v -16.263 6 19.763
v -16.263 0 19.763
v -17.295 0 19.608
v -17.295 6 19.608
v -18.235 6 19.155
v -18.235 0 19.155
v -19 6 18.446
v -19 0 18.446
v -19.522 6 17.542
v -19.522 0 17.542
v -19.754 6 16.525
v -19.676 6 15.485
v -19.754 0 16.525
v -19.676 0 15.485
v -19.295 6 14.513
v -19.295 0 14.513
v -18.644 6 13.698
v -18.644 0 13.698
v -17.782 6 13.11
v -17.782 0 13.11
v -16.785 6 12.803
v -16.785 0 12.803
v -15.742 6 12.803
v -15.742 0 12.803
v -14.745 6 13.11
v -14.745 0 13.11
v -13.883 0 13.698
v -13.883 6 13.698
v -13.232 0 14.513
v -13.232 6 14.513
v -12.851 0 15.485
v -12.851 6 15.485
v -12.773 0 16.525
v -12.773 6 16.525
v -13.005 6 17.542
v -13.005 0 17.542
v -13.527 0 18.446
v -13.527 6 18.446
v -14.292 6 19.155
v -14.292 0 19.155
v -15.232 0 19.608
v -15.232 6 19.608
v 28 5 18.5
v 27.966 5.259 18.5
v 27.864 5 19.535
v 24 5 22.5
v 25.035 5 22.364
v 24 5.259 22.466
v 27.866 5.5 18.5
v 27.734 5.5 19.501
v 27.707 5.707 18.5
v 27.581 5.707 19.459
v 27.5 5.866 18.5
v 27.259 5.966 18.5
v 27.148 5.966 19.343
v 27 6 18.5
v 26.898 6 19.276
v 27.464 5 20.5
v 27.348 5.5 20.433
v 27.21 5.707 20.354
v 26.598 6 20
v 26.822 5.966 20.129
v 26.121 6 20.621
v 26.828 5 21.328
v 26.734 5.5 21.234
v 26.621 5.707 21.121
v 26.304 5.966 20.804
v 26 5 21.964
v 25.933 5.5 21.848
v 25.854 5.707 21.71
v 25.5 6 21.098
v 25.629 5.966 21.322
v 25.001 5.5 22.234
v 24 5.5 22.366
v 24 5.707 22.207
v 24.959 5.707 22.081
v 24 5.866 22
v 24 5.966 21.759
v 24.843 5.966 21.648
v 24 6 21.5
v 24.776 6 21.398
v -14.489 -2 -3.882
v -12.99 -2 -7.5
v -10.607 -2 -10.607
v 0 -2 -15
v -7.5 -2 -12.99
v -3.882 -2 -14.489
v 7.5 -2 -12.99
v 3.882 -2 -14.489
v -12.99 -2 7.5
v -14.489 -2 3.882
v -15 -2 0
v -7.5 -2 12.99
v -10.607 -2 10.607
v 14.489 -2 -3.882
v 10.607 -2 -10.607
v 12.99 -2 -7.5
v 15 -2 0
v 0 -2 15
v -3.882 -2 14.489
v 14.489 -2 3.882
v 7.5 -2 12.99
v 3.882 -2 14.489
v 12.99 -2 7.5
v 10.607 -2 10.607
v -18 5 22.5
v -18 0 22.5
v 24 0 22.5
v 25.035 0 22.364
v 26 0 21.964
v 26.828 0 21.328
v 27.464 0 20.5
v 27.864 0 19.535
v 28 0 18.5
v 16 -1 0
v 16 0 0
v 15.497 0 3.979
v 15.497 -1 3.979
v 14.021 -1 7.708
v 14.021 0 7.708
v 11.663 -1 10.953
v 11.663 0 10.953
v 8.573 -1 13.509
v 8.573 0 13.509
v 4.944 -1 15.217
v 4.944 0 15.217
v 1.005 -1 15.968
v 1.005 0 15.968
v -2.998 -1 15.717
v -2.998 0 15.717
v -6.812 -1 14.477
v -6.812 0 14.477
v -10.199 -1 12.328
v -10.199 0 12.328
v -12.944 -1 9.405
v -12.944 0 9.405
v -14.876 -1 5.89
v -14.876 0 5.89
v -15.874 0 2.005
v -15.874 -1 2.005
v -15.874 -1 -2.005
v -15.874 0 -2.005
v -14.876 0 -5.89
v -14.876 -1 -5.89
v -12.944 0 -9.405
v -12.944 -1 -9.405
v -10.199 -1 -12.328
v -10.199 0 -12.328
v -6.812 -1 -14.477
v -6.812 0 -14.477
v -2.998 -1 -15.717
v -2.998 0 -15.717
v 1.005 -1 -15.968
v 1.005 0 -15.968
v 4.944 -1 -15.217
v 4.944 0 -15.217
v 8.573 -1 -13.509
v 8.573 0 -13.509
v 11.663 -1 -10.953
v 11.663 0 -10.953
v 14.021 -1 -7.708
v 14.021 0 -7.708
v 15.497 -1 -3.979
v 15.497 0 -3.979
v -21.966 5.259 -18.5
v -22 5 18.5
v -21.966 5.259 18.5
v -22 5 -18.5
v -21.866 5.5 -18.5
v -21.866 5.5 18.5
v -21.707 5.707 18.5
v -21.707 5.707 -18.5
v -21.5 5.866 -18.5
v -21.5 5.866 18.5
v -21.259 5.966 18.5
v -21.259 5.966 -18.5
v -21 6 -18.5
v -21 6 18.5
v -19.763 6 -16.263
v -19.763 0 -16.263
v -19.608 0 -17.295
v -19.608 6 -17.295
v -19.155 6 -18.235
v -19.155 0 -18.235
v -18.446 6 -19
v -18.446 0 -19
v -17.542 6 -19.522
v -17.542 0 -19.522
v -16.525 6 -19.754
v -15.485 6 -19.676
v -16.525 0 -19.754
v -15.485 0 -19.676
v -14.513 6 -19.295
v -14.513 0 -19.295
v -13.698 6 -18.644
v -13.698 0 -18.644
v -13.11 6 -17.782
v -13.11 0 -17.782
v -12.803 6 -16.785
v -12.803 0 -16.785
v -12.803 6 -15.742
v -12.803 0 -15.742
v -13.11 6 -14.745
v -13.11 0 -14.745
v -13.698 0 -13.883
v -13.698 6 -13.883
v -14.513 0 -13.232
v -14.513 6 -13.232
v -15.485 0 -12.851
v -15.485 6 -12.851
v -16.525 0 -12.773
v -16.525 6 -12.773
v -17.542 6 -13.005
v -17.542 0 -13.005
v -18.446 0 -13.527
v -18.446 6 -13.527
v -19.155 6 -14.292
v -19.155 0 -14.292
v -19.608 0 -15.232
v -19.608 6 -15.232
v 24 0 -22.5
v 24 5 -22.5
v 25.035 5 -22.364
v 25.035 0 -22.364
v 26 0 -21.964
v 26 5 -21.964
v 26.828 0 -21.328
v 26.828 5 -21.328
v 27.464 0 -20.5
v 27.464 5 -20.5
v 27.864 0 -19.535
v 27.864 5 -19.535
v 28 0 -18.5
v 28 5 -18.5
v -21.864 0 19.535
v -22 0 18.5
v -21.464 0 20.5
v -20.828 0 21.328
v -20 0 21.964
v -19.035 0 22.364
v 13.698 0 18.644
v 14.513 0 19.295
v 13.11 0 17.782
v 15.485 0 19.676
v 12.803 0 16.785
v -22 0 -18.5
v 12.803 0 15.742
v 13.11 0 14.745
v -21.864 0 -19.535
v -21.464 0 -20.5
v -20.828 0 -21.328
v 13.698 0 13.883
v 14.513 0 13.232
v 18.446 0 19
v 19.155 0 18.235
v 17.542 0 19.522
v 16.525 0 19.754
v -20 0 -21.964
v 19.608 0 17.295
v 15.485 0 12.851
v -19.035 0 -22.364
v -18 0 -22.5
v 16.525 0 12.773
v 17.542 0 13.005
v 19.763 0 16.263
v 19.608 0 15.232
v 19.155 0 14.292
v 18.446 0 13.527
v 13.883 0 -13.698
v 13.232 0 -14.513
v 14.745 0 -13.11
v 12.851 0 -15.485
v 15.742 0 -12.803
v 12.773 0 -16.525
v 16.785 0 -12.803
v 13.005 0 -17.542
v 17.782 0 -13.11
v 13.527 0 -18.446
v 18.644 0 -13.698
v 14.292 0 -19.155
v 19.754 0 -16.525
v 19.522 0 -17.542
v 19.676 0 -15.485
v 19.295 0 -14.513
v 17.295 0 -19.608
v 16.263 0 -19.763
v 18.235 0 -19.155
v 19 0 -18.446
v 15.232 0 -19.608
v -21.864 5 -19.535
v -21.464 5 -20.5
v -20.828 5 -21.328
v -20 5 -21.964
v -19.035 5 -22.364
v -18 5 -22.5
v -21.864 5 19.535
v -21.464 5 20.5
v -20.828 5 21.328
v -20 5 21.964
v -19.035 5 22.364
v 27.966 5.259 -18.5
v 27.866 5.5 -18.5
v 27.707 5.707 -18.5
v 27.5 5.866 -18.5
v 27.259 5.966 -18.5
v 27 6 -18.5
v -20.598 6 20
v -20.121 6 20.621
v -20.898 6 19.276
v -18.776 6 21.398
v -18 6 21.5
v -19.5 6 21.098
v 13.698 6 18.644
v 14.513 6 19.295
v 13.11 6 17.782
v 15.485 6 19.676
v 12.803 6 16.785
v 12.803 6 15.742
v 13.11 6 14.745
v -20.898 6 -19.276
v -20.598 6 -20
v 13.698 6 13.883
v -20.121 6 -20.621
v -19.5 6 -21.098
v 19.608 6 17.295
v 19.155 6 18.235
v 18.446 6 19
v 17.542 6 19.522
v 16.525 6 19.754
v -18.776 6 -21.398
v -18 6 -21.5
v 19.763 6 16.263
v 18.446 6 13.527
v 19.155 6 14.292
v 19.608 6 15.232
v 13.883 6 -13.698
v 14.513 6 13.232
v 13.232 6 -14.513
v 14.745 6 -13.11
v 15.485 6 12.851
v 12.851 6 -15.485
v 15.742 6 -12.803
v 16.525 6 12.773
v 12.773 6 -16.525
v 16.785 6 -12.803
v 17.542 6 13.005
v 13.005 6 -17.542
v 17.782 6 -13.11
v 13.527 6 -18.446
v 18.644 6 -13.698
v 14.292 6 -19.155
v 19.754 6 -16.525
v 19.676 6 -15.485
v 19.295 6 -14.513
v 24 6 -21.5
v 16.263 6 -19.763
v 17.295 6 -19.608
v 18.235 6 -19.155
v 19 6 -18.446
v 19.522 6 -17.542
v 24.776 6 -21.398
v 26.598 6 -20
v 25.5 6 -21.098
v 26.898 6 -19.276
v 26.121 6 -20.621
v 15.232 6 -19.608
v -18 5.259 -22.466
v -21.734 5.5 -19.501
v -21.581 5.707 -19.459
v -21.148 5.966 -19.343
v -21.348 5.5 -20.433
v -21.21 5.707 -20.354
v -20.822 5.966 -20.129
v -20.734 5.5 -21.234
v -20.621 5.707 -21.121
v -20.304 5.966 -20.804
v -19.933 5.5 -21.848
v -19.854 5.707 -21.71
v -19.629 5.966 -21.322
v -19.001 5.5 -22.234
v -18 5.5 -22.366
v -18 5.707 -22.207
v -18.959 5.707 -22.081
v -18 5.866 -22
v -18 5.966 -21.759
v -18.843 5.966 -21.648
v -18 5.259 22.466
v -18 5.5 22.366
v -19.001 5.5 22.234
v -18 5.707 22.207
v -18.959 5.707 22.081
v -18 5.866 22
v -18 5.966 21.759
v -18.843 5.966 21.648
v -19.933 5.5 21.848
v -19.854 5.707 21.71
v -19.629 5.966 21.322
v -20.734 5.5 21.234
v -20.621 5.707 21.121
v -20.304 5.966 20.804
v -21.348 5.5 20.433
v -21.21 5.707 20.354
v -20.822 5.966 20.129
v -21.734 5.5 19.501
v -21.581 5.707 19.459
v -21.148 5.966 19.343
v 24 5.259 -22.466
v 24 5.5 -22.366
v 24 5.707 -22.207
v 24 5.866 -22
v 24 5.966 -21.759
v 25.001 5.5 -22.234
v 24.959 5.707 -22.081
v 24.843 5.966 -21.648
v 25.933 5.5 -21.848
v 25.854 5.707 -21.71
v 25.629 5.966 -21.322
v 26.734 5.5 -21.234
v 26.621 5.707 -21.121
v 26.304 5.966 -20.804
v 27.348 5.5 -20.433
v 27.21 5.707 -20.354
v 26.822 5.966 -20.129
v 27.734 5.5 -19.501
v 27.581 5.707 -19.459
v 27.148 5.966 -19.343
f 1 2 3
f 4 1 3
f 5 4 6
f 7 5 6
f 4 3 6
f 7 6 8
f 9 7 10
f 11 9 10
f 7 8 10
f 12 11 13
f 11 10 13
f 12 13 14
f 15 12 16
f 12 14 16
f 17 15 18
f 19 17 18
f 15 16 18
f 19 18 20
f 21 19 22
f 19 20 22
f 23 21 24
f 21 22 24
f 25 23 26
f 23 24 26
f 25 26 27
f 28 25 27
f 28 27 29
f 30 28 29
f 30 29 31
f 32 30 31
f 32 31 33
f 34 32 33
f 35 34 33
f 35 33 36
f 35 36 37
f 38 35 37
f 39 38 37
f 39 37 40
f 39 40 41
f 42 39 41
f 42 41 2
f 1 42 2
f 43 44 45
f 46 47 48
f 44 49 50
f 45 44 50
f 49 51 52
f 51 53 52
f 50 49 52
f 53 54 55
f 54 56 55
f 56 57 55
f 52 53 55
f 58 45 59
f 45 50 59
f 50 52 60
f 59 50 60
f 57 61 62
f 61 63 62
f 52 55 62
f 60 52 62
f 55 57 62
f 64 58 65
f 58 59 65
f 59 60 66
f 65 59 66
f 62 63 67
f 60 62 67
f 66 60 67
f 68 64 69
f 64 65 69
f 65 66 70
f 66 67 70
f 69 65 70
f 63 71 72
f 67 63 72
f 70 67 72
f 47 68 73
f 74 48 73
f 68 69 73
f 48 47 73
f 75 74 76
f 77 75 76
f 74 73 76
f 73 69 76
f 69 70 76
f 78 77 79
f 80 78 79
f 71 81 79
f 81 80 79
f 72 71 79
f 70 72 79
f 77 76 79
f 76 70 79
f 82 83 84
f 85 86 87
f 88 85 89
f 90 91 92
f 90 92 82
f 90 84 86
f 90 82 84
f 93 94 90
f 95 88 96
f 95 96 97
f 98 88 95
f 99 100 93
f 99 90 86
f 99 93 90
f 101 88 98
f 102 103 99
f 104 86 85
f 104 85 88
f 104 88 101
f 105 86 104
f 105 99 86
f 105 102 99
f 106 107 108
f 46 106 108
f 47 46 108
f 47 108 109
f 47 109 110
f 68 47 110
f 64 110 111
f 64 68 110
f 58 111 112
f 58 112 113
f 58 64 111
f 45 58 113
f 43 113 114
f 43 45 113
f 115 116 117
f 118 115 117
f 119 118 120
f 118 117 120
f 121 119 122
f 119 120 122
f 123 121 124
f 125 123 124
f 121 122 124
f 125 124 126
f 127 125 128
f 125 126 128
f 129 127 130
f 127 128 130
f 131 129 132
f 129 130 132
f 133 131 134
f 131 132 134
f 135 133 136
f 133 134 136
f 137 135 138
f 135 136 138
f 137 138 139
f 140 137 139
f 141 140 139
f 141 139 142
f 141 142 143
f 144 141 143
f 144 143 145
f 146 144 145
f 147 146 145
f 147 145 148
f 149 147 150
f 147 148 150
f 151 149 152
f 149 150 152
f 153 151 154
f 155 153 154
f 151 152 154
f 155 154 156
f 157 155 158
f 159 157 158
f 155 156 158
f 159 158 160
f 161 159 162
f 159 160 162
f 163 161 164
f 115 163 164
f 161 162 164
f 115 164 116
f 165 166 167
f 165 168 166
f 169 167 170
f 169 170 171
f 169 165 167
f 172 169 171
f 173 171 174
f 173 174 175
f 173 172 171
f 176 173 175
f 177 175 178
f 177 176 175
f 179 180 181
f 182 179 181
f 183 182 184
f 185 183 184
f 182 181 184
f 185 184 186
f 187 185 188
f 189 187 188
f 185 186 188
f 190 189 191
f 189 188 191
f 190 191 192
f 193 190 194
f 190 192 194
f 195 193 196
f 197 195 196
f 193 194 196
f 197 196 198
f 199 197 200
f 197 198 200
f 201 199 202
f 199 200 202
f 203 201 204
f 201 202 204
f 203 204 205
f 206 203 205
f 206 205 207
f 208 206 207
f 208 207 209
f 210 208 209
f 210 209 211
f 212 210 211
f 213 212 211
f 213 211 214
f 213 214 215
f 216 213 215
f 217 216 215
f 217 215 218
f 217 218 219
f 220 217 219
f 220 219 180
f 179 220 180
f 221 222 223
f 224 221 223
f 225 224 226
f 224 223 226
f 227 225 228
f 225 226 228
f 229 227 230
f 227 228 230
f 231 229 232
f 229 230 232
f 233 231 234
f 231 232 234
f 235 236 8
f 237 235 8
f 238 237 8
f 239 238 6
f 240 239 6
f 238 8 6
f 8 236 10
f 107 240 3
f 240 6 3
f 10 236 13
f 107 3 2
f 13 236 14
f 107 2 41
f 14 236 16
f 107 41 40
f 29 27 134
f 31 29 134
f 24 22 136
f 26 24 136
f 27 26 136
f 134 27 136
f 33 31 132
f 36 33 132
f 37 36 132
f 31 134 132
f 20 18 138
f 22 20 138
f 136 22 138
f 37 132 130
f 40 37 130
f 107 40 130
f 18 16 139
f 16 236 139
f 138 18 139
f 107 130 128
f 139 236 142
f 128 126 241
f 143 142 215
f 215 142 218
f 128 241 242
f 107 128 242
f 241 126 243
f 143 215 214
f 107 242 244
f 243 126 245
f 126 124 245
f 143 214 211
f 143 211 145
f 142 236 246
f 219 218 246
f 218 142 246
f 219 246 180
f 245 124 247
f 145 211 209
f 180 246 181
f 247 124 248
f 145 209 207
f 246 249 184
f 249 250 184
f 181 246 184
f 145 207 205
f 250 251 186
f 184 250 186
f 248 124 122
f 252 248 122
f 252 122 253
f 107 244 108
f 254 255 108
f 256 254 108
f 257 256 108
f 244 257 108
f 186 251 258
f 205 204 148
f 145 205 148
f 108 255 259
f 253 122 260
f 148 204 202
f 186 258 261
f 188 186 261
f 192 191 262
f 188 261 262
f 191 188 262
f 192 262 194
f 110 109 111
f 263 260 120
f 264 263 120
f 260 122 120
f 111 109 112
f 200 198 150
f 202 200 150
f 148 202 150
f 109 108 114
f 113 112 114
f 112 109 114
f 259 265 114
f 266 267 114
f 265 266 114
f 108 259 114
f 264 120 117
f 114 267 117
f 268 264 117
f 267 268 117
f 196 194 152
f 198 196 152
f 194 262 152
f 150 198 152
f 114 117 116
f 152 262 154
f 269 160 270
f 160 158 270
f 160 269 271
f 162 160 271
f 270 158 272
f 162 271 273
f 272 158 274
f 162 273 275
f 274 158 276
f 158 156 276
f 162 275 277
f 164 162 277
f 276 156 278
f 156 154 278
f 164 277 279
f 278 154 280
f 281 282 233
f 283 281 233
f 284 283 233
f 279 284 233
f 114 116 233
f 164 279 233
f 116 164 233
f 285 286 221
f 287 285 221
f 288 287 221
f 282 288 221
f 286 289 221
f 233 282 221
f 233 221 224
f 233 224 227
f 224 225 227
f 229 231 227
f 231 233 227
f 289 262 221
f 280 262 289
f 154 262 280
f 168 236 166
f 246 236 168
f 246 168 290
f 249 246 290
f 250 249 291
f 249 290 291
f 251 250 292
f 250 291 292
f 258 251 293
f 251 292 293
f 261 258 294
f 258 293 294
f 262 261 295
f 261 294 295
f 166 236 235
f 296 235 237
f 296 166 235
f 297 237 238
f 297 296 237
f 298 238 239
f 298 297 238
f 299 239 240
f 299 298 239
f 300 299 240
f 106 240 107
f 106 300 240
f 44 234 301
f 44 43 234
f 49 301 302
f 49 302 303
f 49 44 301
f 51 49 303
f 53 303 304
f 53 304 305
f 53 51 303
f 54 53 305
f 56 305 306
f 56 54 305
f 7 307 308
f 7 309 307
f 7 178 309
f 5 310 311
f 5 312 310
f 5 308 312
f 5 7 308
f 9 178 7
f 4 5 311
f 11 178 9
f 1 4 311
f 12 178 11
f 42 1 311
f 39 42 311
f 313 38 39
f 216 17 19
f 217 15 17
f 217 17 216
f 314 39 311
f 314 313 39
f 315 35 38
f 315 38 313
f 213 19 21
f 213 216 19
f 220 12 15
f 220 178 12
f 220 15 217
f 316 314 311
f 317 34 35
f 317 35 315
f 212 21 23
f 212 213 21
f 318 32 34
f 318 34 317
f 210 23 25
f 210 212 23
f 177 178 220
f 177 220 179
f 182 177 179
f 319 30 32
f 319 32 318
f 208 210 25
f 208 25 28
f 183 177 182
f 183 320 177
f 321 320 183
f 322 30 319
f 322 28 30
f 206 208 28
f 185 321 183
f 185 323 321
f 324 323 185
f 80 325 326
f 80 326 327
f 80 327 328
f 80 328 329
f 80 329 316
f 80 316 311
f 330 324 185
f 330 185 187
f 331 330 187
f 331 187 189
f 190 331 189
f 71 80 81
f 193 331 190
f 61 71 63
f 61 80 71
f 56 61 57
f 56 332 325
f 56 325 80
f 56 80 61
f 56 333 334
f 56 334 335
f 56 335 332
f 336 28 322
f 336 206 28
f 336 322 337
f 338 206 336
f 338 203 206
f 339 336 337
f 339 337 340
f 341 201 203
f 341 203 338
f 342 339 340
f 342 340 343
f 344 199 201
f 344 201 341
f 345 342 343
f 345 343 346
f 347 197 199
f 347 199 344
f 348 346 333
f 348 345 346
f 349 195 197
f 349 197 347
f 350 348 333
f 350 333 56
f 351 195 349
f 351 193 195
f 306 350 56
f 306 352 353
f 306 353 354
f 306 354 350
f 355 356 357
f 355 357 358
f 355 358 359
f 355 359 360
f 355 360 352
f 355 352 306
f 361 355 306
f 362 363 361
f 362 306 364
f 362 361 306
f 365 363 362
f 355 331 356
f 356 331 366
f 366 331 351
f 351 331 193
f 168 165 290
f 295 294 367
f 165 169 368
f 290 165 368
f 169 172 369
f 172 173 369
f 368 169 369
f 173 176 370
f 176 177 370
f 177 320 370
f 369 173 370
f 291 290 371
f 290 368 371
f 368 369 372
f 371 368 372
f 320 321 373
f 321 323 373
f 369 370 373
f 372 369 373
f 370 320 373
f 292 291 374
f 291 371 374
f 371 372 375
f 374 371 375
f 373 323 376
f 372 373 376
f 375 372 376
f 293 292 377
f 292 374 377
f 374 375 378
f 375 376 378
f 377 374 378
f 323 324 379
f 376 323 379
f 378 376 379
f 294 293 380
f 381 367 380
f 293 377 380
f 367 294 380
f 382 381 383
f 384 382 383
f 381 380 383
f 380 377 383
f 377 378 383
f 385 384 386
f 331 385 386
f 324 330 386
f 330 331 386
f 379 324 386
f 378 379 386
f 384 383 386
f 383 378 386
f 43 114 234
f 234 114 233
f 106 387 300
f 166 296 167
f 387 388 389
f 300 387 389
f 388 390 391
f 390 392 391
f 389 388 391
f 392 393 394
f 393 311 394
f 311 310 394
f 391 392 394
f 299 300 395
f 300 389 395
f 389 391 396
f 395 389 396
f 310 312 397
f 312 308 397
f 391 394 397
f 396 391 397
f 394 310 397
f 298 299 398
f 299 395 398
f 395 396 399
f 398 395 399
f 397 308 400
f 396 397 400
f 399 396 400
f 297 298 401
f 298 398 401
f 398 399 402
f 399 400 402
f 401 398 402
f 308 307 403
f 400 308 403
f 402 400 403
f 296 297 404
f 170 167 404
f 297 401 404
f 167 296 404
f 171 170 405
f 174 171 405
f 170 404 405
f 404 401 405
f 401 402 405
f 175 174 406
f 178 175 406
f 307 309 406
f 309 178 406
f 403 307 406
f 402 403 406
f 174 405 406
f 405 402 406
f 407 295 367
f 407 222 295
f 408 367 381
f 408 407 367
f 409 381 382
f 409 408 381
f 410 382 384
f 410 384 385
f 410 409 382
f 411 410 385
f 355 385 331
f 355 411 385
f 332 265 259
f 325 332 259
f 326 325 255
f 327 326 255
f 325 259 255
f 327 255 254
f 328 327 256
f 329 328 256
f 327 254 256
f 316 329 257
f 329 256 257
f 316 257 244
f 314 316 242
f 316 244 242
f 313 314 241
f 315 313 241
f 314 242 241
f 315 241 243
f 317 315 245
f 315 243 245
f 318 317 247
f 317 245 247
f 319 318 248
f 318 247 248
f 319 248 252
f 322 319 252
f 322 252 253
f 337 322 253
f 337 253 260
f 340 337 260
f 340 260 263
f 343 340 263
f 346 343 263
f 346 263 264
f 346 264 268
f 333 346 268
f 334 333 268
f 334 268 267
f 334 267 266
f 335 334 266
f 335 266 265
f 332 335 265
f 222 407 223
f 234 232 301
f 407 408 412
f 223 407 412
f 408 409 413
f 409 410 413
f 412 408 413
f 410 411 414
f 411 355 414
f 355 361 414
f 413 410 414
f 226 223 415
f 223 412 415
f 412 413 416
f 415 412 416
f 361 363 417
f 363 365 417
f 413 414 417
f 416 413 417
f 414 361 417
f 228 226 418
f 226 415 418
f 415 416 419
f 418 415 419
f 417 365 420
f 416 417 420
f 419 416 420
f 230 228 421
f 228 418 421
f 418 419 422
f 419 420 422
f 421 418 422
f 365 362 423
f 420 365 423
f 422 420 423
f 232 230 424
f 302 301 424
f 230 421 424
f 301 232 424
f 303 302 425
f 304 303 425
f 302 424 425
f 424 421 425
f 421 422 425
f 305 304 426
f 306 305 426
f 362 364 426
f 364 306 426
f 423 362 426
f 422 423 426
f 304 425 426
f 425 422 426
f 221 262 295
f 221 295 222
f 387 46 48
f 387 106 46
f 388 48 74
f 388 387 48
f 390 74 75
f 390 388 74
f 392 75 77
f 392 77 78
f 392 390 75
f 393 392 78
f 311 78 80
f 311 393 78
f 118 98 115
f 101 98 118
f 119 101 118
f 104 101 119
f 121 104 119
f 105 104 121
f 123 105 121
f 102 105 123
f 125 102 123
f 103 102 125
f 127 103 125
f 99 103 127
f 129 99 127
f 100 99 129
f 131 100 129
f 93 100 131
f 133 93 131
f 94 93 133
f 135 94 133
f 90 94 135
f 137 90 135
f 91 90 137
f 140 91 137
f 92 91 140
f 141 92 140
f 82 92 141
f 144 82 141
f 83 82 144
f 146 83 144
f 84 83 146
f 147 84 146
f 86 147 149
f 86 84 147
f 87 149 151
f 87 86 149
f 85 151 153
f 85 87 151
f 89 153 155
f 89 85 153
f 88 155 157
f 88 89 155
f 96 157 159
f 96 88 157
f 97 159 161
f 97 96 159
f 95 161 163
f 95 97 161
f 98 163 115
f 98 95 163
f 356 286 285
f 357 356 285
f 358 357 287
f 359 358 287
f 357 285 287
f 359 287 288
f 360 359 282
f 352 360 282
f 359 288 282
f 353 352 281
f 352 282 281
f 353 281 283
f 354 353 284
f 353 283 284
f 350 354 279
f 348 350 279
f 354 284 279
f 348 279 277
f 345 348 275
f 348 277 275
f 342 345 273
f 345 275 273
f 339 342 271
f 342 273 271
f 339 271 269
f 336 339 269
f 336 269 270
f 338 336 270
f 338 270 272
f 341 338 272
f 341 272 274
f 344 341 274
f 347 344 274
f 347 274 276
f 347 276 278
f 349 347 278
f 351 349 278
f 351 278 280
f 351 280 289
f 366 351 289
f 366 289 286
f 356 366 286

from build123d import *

# Parameters (mm, degrees)
SKETCH1_W           = 50
SKETCH1_H           = 45
BODY_DEPTH          = 6
SKETCH4_R           = 16
ROUND_2_DEPTH       = 2
F_1X45_CHAMFER_SIZE = 1
SKETCH5_R           = 3.5
HOLE_1_DEPTH        = 7
HOLES_2_4_COUNT     = 4
R4_FILLETS_R        = 4
R1_FILLET_R         = 1


with BuildPart() as part:
    # Sketch1 → Body (new body)
    with BuildSketch(Plane(origin=(0, 0, 0), x_dir=(1, 0, 0), z_dir=(0, 1, 0))):
        with Locations((3, 0)):
            Rectangle(SKETCH1_W, SKETCH1_H)
    extrude(amount=BODY_DEPTH)

    # Sketch4 → Round 2 (add)
    with BuildSketch(Plane.XZ):
        Circle(SKETCH4_R)
    extrude(amount=ROUND_2_DEPTH)

    # 1x45 Chamfer
    f_1x45_chamfer_edges = [part.edges().sort_by_distance(p)[0] for p in [
        (-16, -2, 0),
    ]]
    chamfer(f_1x45_chamfer_edges, length=F_1X45_CHAMFER_SIZE)

    # Sketch5 → Hole 1 (cut, through all)
    with BuildSketch(Plane.XZ):
        with Locations((16.263455967, 16.263455967)):
            Circle(SKETCH5_R)
    hole_1 = extrude(amount=-HOLE_1_DEPTH, mode=Mode.SUBTRACT)

    # Holes 2-4: Hole 1 ×4 about axis
    holes_2_4_axis = Axis((0, 0, 0), (0, 1, 0))
    for i in range(1, HOLES_2_4_COUNT):
        add(hole_1.rotate(holes_2_4_axis, i * 360 / HOLES_2_4_COUNT), mode=Mode.SUBTRACT)

    # R4 Fillets
    r4_fillets_edges = [part.edges().sort_by_distance(p)[0] for p in [
        (-22, 3, -22.5),
        (28, 3, -22.5),
        (28, 3, 22.5),
        (-22, 3, 22.5),
    ]]
    fillet(r4_fillets_edges, radius=R4_FILLETS_R)

    # R1 Fillet
    r1_fillet_edges = [part.edges().sort_by_distance(p)[0] for p in [
        (-22, 6, 0),
        (3, 6, -22.5),
        (3, 6, 22.5),
        (28, 6, 0),
        (26.828427125, 6, 21.328427125),
        (-20.828427125, 6, 21.328427125),
        (26.828427125, 6, -21.328427125),
        (-20.828427125, 6, -21.328427125),
    ]]
    fillet(r1_fillet_edges, radius=R1_FILLET_R)


solid = part.part
